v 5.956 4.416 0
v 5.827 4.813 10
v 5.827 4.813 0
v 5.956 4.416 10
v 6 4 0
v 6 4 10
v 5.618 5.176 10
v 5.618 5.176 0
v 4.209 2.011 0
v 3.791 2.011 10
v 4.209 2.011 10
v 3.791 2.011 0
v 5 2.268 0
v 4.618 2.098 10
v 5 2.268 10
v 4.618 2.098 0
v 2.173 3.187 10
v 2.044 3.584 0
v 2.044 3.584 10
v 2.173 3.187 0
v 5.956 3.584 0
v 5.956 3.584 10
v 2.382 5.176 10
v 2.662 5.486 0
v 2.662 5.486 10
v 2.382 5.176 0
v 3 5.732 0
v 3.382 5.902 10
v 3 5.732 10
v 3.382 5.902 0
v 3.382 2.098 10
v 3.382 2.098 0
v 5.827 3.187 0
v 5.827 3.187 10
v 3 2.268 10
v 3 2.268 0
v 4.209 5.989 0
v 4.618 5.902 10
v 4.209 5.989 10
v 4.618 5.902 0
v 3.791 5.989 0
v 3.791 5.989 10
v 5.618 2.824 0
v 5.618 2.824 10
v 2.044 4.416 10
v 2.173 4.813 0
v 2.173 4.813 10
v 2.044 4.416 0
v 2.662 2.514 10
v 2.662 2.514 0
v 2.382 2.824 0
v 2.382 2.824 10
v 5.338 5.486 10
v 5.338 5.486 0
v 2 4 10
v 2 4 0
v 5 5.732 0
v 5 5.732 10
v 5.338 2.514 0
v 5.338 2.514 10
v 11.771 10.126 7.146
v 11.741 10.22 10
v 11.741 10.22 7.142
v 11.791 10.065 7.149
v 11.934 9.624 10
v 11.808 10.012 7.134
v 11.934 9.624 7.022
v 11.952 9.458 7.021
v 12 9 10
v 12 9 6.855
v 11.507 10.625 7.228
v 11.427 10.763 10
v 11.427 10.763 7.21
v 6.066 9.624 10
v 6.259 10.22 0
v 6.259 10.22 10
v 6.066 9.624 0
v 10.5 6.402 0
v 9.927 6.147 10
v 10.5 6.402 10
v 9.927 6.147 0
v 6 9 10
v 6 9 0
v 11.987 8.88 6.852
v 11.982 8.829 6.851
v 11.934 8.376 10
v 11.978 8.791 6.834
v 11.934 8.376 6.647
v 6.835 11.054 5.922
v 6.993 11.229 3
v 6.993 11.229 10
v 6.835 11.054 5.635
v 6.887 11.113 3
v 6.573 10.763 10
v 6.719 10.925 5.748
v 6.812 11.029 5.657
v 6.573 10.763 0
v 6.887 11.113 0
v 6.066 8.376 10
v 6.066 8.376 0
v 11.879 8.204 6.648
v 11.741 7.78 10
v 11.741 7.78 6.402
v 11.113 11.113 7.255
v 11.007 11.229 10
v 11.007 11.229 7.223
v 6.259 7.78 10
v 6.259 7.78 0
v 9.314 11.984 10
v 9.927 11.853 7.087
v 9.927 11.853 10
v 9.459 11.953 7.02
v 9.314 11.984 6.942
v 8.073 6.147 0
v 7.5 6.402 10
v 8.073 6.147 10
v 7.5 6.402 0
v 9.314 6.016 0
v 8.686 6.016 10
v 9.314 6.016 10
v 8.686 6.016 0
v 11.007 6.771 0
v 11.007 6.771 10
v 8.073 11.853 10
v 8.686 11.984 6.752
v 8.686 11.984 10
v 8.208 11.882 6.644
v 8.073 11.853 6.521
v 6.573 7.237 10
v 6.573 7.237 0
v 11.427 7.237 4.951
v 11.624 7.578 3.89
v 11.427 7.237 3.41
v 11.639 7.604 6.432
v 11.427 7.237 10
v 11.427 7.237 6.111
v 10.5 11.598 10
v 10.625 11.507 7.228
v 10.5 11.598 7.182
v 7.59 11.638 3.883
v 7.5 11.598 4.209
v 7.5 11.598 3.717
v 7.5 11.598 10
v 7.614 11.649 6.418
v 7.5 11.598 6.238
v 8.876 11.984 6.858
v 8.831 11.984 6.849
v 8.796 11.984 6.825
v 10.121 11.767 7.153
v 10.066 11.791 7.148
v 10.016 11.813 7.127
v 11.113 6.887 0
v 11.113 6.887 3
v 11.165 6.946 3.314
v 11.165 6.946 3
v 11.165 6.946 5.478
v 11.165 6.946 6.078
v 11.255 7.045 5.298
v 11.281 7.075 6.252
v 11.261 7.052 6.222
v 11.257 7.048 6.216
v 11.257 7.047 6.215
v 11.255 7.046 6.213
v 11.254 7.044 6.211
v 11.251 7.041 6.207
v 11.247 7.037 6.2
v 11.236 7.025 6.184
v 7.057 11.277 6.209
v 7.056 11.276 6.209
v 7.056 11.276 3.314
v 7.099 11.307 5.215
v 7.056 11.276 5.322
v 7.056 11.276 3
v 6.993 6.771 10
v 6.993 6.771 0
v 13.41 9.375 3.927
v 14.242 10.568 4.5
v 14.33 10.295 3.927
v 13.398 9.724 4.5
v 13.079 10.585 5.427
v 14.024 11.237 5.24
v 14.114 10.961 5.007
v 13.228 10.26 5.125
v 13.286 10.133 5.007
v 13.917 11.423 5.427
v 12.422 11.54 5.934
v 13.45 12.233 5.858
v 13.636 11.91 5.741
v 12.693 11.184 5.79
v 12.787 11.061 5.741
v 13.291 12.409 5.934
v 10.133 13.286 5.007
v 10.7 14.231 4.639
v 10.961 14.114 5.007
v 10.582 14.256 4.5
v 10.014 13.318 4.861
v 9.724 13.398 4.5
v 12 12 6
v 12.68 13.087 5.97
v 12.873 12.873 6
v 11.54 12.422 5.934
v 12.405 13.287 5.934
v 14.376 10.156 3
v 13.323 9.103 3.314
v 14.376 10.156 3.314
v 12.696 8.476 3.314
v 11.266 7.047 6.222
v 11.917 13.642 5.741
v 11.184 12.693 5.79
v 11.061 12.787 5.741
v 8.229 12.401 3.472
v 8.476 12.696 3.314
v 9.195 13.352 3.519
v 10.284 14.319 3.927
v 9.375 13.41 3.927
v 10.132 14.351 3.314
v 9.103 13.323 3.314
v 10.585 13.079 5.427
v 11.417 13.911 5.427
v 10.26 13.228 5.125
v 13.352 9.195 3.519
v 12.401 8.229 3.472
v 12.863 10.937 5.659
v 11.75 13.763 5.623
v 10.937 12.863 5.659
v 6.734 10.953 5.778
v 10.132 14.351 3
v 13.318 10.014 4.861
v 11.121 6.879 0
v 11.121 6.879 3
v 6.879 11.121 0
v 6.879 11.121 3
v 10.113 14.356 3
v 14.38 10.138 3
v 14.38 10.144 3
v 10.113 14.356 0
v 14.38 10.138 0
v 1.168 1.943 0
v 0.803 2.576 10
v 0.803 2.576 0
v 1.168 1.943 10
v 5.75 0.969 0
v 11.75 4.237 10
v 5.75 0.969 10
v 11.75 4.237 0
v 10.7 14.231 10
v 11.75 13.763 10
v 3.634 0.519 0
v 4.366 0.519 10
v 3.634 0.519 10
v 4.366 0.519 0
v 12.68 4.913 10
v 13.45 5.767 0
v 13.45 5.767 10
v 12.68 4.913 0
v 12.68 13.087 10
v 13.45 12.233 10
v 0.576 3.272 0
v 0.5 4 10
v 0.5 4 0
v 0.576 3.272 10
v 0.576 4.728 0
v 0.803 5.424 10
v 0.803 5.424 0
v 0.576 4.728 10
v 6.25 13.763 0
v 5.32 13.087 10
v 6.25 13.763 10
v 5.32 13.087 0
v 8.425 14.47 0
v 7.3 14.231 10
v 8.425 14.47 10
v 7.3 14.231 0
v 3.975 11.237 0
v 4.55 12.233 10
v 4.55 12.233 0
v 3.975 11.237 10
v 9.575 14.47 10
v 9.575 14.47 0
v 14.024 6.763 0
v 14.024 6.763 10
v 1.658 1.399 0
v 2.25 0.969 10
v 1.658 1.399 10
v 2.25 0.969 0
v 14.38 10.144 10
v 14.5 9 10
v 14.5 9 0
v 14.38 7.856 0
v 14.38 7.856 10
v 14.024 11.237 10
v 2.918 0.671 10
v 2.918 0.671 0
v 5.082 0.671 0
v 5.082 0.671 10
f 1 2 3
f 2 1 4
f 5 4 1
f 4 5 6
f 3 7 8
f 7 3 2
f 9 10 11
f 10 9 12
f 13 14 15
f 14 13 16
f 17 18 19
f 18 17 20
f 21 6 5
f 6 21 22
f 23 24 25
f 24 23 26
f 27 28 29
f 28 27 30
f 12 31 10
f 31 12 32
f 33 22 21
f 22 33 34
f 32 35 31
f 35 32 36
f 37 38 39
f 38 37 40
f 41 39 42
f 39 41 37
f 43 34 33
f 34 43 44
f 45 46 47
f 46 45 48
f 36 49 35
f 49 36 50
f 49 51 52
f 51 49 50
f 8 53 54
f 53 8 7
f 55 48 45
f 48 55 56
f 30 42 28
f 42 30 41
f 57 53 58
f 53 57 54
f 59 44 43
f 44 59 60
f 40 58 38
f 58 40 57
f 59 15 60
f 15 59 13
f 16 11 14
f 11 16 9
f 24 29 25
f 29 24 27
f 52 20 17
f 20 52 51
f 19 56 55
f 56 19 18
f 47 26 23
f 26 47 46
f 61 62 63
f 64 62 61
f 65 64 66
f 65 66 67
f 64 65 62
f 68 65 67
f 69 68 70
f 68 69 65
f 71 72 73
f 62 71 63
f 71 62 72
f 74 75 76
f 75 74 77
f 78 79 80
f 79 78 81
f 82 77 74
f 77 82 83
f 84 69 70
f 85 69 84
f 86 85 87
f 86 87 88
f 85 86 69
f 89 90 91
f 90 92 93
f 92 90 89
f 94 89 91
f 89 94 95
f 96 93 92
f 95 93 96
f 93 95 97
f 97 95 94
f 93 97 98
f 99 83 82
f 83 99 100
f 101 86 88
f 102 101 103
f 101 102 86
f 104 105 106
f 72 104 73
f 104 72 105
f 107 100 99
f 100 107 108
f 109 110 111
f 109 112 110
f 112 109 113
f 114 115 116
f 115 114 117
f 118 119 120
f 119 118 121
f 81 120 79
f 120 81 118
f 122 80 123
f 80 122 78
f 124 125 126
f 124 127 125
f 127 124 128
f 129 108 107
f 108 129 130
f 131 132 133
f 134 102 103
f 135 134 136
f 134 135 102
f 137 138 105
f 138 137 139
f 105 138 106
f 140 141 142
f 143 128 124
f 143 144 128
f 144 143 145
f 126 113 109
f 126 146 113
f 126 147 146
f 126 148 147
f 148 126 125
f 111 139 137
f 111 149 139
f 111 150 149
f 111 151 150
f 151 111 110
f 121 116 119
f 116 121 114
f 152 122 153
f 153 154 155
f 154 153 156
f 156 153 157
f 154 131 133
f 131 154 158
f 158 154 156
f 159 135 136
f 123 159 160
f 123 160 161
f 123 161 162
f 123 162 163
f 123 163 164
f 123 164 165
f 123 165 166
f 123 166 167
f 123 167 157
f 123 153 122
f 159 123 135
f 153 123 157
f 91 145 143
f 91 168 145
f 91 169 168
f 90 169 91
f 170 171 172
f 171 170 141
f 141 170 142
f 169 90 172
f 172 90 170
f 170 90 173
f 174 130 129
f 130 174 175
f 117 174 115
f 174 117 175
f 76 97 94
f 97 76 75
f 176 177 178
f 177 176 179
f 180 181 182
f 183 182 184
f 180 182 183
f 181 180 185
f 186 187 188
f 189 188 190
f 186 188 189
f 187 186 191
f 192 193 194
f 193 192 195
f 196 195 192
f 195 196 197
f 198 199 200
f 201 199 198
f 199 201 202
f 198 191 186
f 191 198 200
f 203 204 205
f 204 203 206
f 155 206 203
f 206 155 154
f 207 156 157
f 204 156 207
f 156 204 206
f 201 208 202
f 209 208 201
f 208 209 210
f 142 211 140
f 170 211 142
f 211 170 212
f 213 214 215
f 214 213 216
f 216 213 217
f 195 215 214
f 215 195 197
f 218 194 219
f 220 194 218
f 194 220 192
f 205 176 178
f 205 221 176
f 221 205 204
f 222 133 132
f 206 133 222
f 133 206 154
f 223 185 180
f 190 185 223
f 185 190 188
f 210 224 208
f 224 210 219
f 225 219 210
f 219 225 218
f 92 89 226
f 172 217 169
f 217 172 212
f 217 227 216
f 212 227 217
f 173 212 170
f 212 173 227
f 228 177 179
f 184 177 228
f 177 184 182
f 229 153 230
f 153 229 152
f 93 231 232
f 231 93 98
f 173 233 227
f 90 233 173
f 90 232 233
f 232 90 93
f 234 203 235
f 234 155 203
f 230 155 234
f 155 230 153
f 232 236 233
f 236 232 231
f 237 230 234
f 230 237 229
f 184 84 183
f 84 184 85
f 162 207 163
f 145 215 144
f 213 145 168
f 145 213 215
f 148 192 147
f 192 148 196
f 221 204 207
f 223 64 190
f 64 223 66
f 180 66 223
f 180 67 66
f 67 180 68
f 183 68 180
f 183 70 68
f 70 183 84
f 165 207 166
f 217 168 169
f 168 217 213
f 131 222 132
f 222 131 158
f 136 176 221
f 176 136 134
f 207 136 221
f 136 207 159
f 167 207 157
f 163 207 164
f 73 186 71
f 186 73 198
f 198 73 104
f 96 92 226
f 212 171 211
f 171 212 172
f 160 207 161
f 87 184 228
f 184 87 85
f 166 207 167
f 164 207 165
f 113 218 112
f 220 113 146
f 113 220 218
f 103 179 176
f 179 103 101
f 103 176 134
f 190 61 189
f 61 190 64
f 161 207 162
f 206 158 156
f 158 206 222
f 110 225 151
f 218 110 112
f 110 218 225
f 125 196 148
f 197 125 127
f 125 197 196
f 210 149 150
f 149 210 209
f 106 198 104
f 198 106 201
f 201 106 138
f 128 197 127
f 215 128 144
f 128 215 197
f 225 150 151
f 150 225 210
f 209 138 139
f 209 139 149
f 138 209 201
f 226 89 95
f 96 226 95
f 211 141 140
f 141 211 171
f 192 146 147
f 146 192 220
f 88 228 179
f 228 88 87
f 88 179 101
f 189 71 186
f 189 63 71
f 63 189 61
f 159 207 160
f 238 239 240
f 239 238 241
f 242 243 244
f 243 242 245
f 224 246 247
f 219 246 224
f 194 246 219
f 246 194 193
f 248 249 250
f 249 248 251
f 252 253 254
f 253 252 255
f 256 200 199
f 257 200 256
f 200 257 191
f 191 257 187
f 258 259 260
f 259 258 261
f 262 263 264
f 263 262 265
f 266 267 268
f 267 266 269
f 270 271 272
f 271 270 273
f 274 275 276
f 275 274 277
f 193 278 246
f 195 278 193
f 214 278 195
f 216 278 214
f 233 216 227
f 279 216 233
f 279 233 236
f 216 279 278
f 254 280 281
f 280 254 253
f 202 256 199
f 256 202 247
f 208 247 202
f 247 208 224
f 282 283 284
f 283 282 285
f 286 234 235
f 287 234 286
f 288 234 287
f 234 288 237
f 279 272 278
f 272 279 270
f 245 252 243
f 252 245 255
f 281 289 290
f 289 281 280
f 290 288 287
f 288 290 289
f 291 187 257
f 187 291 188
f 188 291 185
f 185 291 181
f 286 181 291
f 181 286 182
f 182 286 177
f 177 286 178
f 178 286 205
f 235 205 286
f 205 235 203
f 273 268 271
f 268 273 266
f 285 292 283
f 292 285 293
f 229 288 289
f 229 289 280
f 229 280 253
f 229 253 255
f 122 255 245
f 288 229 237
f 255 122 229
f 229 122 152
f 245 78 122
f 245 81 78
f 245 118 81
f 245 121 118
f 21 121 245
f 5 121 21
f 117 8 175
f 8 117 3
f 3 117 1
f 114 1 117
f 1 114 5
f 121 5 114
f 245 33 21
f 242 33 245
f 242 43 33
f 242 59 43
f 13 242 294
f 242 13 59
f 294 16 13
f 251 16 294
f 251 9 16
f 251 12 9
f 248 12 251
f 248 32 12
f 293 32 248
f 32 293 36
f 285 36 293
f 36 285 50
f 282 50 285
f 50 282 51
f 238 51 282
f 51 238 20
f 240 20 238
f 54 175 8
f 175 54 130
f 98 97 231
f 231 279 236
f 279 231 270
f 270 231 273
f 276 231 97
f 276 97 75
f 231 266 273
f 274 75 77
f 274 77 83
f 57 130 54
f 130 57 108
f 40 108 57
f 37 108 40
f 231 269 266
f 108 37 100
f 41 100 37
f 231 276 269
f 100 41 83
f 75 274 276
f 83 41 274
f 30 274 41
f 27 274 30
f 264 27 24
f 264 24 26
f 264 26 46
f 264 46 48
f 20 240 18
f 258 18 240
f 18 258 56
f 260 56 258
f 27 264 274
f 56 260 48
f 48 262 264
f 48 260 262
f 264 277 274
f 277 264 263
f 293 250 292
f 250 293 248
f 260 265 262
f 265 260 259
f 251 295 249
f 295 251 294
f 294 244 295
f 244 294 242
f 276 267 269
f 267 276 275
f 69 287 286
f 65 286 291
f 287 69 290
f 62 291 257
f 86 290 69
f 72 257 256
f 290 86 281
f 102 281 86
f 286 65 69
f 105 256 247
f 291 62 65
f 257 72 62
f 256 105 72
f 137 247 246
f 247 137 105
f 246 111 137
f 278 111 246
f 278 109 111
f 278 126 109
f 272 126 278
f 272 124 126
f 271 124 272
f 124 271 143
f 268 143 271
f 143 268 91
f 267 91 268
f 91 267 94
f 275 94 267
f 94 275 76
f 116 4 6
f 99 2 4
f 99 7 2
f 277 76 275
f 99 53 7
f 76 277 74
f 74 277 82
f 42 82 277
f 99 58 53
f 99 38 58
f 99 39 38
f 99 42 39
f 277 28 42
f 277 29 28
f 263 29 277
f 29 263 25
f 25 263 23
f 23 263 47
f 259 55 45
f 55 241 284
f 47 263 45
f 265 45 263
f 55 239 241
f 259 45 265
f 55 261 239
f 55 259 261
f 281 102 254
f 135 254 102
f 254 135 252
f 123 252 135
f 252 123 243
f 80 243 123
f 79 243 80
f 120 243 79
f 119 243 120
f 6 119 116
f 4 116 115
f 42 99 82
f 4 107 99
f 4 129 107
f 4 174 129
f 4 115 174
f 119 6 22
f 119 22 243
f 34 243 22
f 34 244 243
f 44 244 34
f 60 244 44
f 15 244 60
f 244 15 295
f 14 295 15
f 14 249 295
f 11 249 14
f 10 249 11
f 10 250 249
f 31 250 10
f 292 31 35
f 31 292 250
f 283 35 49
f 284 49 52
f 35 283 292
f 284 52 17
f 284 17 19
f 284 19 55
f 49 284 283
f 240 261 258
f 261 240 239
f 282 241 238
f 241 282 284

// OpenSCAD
$fn=30;
cable_diameter=6;
around_cable_thickness=5;
cable_pos=9;
screw_diameter=4;
around_screw_thickness=3;
screw_pos=4;
height=10;

difference() {
hull() 
    {
        translate([screw_pos,screw_pos,0]) cylinder(d=around_screw_thickness+screw_diameter,h=height);
        translate([cable_pos,cable_pos,0]) cylinder(d=cable_diameter+around_cable_thickness,h=height);
    }
union() {
translate([0,0,-2])
{
translate([screw_pos,screw_pos,0]) cylinder(d=screw_diameter,h=height*2);
    
translate([cable_pos,cable_pos,0]) cylinder(d=cable_diameter,h=height*2);
    
}
translate([cable_pos,cable_pos,cable_diameter/2]) rotate([0,90,45]) {
    cylinder(d=cable_diameter,h=2*height);
    translate([cable_diameter/2,0,cable_diameter/2]) cube([cable_diameter,cable_diameter,cable_diameter],center=true);
    translate([-cable_diameter/2,0,0]) rotate([0,45,0])
        cylinder(d=cable_diameter,h=2*cable_diameter);
    
}
}
}
